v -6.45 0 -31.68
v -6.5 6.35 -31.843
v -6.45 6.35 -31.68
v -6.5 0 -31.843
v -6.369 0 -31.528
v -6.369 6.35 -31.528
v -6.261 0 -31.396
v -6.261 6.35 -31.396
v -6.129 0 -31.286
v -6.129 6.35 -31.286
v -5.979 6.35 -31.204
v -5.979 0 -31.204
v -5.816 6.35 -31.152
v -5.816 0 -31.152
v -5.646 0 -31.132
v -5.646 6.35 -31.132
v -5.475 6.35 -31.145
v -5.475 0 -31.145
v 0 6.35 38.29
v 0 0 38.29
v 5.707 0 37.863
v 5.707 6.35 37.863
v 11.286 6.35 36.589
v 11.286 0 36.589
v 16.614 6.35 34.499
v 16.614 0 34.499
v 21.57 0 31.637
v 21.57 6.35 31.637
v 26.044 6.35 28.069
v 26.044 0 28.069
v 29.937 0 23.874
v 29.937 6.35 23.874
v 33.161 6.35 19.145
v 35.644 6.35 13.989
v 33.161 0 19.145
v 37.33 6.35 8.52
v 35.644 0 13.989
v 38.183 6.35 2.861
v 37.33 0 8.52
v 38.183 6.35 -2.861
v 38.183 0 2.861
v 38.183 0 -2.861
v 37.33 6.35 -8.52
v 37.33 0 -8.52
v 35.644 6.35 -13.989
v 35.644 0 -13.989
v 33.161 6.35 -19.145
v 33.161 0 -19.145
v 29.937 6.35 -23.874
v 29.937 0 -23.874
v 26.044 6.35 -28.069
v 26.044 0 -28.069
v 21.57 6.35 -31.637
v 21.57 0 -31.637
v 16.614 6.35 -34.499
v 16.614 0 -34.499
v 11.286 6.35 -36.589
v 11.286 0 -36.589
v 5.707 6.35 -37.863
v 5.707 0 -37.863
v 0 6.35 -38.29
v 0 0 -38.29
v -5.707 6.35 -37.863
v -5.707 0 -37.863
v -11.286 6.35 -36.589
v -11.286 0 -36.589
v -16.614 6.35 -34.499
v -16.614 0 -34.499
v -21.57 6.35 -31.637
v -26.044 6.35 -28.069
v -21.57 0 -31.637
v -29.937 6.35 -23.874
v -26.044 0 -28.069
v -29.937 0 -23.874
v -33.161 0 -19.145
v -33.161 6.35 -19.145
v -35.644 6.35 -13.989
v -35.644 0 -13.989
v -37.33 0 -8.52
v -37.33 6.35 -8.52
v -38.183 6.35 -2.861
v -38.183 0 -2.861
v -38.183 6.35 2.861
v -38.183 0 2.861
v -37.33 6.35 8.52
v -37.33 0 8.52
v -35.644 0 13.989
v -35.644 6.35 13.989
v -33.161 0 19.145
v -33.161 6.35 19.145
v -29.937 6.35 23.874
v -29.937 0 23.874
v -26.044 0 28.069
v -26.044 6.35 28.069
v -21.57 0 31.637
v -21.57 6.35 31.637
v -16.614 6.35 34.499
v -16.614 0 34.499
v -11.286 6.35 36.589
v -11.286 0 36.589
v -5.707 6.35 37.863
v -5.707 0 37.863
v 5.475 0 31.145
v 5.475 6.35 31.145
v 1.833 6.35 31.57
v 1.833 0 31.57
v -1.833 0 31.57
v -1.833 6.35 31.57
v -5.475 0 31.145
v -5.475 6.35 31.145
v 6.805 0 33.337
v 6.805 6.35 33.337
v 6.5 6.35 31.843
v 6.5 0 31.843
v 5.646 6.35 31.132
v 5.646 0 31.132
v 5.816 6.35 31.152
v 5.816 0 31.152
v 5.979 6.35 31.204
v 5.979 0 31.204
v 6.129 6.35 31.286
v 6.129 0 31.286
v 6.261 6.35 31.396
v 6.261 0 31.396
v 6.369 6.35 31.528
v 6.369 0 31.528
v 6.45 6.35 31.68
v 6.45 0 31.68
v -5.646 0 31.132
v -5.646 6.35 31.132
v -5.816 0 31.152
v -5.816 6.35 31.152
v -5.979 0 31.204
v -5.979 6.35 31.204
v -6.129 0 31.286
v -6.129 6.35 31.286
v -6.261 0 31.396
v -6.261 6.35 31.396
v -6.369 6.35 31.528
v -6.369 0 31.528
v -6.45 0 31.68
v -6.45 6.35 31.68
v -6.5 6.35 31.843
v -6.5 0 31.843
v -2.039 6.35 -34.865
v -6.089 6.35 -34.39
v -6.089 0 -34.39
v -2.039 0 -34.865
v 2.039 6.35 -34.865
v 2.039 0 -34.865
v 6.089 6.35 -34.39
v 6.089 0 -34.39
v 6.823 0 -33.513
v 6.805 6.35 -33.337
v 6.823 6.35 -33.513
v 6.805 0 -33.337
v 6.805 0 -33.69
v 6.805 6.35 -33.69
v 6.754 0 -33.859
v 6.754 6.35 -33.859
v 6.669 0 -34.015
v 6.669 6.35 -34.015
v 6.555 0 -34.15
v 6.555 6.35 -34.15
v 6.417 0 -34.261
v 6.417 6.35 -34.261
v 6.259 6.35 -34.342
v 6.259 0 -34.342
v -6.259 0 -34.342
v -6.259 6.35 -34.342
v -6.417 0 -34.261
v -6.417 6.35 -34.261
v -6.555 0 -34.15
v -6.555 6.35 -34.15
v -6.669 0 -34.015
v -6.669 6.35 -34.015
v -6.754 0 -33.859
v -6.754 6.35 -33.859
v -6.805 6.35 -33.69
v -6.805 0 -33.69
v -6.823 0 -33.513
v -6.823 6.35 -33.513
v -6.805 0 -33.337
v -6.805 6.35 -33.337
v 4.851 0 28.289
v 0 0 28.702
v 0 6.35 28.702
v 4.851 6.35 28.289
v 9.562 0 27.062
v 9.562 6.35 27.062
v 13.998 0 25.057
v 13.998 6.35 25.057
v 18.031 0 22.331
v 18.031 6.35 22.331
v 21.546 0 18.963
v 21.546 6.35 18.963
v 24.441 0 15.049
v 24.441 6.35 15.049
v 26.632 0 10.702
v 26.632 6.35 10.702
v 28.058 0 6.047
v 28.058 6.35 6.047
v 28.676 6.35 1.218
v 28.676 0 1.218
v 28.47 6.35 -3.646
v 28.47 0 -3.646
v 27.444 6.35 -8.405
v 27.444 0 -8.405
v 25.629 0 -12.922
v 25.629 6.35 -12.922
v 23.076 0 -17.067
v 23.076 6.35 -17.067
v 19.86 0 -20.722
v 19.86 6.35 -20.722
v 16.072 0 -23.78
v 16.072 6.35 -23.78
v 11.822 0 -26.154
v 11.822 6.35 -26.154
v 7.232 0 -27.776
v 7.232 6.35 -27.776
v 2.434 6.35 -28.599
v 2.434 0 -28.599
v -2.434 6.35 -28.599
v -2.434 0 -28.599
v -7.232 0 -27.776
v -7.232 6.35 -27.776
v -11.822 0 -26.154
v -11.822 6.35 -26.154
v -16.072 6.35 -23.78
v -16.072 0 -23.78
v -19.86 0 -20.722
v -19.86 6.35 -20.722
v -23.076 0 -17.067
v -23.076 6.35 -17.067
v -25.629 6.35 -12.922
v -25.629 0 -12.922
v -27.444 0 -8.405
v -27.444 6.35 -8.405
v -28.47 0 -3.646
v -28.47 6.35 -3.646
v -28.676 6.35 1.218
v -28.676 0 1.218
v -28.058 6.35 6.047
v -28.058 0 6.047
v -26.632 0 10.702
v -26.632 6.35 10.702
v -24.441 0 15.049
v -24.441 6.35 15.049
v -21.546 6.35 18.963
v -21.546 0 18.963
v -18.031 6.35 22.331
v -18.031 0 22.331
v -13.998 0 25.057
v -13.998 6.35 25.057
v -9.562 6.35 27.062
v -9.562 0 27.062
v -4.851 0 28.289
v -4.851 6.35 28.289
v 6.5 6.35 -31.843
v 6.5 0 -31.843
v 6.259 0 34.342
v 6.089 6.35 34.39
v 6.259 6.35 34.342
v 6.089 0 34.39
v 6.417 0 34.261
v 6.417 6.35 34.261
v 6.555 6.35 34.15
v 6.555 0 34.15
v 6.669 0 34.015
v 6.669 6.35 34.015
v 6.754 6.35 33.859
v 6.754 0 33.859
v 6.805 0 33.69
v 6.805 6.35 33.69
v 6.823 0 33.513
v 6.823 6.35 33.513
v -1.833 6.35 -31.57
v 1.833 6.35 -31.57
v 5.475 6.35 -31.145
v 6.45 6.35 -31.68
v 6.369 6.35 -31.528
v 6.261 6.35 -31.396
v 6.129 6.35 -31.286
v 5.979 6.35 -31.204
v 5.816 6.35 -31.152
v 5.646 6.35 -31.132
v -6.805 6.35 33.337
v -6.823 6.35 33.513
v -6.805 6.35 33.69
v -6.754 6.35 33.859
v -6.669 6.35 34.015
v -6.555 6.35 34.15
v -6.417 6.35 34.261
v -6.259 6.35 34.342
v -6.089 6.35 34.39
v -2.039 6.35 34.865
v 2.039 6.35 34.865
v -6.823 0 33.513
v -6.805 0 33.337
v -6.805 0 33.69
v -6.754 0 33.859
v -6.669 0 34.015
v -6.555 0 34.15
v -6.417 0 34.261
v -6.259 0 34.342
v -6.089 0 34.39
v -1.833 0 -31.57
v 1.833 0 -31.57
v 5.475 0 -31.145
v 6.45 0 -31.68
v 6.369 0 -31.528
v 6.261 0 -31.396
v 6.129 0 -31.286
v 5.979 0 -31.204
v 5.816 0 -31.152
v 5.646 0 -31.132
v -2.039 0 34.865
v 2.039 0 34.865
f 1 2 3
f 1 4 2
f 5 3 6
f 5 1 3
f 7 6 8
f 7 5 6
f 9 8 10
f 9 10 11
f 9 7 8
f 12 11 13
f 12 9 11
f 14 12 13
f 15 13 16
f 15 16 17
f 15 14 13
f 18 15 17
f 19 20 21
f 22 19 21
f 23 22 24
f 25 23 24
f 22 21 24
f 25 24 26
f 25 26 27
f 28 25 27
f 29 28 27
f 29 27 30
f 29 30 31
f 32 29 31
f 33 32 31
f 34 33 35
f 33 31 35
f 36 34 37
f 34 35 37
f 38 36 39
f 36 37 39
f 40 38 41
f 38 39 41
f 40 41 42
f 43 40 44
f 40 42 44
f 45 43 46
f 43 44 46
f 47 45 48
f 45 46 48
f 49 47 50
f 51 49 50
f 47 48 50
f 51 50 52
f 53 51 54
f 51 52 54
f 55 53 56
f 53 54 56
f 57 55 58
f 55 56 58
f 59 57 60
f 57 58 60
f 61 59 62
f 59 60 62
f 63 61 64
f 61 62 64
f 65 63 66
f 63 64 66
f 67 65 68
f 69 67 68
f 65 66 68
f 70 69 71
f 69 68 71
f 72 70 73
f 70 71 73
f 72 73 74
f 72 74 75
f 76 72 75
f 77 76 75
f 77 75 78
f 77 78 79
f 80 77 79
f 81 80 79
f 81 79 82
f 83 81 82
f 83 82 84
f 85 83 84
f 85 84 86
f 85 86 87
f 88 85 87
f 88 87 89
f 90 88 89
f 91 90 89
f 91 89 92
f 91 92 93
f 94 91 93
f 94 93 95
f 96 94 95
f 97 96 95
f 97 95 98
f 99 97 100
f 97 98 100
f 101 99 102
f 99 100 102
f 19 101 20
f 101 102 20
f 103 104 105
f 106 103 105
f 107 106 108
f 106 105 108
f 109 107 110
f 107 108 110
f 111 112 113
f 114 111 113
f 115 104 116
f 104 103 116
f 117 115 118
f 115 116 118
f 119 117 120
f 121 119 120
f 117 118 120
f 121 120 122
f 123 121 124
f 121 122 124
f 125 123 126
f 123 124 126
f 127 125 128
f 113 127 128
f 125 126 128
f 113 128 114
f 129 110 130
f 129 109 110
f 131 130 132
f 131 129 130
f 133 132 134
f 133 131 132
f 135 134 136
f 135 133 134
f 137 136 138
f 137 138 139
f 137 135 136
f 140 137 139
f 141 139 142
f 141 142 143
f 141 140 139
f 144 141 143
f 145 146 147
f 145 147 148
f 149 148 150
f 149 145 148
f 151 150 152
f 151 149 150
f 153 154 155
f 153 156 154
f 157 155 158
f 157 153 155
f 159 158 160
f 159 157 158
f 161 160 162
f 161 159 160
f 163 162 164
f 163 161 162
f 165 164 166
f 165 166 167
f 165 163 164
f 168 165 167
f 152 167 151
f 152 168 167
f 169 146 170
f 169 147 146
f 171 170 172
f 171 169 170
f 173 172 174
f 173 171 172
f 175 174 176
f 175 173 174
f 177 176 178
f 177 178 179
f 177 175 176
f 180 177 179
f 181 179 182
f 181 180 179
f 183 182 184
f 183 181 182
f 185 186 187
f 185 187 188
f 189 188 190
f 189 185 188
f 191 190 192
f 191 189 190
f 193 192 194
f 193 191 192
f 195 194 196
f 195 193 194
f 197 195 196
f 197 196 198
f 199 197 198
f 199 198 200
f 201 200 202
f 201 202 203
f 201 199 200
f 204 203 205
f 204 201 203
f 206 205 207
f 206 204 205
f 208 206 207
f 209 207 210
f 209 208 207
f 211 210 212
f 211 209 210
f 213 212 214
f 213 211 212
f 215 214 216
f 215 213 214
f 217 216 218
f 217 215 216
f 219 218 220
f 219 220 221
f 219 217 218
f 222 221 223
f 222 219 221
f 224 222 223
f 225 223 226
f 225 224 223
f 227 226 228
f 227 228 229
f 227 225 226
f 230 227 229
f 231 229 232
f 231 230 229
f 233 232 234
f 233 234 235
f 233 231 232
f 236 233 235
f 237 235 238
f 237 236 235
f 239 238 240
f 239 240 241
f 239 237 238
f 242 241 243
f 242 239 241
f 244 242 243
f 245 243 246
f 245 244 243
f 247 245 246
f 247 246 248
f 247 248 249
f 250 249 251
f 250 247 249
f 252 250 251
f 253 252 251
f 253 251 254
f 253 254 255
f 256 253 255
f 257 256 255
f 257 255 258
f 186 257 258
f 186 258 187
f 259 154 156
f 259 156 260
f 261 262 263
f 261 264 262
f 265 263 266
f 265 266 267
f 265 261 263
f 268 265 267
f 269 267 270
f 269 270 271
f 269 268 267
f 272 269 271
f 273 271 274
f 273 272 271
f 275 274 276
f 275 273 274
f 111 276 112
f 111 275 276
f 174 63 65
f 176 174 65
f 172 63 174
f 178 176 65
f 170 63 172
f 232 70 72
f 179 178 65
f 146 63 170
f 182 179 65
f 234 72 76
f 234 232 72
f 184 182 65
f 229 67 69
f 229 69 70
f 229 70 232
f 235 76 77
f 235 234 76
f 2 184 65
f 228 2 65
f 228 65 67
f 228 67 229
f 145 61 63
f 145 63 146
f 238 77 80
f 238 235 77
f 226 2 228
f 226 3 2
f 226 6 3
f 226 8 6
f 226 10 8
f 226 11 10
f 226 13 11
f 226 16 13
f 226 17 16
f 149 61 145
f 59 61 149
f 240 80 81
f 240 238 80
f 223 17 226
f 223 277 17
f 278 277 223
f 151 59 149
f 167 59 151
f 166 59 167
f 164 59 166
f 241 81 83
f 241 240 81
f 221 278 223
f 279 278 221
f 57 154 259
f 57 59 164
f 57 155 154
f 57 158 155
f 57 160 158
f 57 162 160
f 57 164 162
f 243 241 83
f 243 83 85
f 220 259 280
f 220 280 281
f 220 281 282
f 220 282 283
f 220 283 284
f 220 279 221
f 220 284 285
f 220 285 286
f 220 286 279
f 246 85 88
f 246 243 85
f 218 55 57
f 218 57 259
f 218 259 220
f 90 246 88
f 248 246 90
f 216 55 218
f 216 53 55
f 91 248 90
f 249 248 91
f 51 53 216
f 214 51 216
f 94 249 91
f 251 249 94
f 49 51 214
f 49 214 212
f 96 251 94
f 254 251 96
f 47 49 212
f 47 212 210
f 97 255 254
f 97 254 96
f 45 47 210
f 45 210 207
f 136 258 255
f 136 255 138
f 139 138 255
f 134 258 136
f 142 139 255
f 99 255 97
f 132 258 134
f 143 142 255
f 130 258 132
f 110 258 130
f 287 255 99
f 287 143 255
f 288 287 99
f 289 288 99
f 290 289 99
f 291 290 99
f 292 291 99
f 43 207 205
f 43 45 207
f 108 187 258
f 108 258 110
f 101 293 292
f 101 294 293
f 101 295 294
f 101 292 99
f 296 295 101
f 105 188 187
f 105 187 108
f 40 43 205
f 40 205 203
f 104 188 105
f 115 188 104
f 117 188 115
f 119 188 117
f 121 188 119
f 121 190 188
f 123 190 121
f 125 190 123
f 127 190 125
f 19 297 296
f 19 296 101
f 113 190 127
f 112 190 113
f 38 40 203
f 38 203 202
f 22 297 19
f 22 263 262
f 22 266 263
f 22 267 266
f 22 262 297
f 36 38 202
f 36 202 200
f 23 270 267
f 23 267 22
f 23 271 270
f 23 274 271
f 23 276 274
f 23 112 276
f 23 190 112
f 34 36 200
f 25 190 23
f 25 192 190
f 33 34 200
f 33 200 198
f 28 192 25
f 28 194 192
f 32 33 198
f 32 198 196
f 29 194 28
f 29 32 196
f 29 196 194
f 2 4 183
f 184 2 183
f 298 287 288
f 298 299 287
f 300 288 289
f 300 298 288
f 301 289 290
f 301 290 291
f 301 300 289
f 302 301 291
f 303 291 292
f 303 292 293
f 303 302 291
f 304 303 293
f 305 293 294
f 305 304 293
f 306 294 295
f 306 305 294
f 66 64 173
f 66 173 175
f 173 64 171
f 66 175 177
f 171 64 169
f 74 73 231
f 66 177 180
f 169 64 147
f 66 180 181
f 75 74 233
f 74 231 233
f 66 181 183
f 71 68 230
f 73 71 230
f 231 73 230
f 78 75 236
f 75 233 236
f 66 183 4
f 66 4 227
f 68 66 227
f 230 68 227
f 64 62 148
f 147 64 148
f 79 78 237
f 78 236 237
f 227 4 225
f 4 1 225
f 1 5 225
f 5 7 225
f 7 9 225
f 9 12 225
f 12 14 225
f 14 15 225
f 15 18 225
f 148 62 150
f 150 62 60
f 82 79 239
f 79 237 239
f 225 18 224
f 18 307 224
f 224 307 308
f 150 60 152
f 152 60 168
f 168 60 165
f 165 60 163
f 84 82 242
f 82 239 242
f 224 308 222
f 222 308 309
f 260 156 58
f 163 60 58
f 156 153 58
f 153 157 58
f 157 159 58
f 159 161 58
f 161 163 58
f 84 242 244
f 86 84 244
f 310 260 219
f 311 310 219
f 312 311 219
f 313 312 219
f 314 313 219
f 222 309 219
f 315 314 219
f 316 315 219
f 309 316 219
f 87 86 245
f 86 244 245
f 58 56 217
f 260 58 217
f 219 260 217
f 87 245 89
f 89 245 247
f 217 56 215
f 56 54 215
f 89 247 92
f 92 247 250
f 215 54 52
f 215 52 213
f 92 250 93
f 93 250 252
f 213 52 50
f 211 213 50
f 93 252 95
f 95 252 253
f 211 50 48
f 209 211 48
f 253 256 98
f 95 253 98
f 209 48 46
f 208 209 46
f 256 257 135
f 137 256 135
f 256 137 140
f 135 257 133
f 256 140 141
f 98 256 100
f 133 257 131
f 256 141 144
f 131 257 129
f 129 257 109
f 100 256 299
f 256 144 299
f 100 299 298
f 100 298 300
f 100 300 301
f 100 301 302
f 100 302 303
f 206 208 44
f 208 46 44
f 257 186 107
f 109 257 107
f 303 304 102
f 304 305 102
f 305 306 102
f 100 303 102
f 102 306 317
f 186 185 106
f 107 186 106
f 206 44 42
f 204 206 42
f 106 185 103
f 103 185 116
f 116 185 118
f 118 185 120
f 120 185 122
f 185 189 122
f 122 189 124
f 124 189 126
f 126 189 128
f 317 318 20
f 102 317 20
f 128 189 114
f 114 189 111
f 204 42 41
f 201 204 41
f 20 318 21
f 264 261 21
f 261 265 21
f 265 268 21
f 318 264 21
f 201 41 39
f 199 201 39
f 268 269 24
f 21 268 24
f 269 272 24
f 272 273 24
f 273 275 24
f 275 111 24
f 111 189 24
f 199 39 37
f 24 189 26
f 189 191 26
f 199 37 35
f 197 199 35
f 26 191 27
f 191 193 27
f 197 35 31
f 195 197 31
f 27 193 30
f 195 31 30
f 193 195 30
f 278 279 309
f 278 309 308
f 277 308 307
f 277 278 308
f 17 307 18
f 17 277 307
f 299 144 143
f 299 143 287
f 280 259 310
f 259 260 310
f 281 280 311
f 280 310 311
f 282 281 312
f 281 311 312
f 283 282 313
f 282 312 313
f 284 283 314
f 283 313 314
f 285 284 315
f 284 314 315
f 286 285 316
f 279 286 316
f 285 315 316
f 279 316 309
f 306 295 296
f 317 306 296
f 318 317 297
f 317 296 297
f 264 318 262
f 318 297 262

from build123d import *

# Parameters (mm, degrees)
SKETCH1_R           = 38.2905
SKETCH1_R_2         = 28.702
BOSS_EXTRUDE1_DEPTH = 6.35
CUT_EXTRUDE1_DEPTH  = 6.35
FILLET1_R           = 0.889


with BuildPart() as part:
    # Sketch1 → Boss-Extrude1 (new body)
    with BuildSketch(Plane(origin=(0, 0, 0), x_dir=(1, 0, 0), z_dir=(0, 1, 0))):
        with Locations(Location((0, 0, 0), (0, 0, 270))):
            Circle(SKETCH1_R)
        with Locations(Location((0, 0, 0), (0, 0, 270))):
            Circle(SKETCH1_R_2, mode=Mode.SUBTRACT)
    extrude(amount=BOSS_EXTRUDE1_DEPTH)

    # Sketch2 → Cut-Extrude1 (cut)
    with BuildSketch(Plane(origin=(0, 6.35, 0), x_dir=(1, 0, 0), z_dir=(0, 1, 0))):
        with BuildLine():
            ThreePointArc((6.3246, 30.984085654), (0, 31.623), (-6.3246, 30.984085654))
            Line((-6.3246, 30.984085654), (-6.985, 34.219371707))
            ThreePointArc((-6.985, 34.219371707), (0, 34.925), (6.985, 34.219371707))
            Line((6.985, 34.219371707), (6.3246, 30.984085654))
        make_face()
        with BuildLine():
            ThreePointArc((6.3246, -30.984085654), (0, -31.623), (-6.3246, -30.984085654))
            Line((-6.3246, -30.984085654), (-6.985, -34.219371707))
            ThreePointArc((-6.985, -34.219371707), (0, -34.925), (6.985, -34.219371707))
            Line((6.985, -34.219371707), (6.3246, -30.984085654))
        make_face()
    extrude(amount=-CUT_EXTRUDE1_DEPTH, mode=Mode.SUBTRACT)

    # Fillet1
    fillet1_edges = [part.edges().sort_by_distance(p)[0] for p in [
        (6.3246, 3.175, -30.984085654),
        (-6.3246, 3.175, -30.984085654),
        (-6.985, 3.175, -34.219371707),
        (6.985, 3.175, -34.219371707),
        (-6.985, 3.175, 34.219371707),
        (-6.3246, 3.175, 30.984085654),
        (6.3246, 3.175, 30.984085654),
        (6.985, 3.175, 34.219371707),
    ]]
    fillet(fillet1_edges, radius=FILLET1_R)


solid = part.part
